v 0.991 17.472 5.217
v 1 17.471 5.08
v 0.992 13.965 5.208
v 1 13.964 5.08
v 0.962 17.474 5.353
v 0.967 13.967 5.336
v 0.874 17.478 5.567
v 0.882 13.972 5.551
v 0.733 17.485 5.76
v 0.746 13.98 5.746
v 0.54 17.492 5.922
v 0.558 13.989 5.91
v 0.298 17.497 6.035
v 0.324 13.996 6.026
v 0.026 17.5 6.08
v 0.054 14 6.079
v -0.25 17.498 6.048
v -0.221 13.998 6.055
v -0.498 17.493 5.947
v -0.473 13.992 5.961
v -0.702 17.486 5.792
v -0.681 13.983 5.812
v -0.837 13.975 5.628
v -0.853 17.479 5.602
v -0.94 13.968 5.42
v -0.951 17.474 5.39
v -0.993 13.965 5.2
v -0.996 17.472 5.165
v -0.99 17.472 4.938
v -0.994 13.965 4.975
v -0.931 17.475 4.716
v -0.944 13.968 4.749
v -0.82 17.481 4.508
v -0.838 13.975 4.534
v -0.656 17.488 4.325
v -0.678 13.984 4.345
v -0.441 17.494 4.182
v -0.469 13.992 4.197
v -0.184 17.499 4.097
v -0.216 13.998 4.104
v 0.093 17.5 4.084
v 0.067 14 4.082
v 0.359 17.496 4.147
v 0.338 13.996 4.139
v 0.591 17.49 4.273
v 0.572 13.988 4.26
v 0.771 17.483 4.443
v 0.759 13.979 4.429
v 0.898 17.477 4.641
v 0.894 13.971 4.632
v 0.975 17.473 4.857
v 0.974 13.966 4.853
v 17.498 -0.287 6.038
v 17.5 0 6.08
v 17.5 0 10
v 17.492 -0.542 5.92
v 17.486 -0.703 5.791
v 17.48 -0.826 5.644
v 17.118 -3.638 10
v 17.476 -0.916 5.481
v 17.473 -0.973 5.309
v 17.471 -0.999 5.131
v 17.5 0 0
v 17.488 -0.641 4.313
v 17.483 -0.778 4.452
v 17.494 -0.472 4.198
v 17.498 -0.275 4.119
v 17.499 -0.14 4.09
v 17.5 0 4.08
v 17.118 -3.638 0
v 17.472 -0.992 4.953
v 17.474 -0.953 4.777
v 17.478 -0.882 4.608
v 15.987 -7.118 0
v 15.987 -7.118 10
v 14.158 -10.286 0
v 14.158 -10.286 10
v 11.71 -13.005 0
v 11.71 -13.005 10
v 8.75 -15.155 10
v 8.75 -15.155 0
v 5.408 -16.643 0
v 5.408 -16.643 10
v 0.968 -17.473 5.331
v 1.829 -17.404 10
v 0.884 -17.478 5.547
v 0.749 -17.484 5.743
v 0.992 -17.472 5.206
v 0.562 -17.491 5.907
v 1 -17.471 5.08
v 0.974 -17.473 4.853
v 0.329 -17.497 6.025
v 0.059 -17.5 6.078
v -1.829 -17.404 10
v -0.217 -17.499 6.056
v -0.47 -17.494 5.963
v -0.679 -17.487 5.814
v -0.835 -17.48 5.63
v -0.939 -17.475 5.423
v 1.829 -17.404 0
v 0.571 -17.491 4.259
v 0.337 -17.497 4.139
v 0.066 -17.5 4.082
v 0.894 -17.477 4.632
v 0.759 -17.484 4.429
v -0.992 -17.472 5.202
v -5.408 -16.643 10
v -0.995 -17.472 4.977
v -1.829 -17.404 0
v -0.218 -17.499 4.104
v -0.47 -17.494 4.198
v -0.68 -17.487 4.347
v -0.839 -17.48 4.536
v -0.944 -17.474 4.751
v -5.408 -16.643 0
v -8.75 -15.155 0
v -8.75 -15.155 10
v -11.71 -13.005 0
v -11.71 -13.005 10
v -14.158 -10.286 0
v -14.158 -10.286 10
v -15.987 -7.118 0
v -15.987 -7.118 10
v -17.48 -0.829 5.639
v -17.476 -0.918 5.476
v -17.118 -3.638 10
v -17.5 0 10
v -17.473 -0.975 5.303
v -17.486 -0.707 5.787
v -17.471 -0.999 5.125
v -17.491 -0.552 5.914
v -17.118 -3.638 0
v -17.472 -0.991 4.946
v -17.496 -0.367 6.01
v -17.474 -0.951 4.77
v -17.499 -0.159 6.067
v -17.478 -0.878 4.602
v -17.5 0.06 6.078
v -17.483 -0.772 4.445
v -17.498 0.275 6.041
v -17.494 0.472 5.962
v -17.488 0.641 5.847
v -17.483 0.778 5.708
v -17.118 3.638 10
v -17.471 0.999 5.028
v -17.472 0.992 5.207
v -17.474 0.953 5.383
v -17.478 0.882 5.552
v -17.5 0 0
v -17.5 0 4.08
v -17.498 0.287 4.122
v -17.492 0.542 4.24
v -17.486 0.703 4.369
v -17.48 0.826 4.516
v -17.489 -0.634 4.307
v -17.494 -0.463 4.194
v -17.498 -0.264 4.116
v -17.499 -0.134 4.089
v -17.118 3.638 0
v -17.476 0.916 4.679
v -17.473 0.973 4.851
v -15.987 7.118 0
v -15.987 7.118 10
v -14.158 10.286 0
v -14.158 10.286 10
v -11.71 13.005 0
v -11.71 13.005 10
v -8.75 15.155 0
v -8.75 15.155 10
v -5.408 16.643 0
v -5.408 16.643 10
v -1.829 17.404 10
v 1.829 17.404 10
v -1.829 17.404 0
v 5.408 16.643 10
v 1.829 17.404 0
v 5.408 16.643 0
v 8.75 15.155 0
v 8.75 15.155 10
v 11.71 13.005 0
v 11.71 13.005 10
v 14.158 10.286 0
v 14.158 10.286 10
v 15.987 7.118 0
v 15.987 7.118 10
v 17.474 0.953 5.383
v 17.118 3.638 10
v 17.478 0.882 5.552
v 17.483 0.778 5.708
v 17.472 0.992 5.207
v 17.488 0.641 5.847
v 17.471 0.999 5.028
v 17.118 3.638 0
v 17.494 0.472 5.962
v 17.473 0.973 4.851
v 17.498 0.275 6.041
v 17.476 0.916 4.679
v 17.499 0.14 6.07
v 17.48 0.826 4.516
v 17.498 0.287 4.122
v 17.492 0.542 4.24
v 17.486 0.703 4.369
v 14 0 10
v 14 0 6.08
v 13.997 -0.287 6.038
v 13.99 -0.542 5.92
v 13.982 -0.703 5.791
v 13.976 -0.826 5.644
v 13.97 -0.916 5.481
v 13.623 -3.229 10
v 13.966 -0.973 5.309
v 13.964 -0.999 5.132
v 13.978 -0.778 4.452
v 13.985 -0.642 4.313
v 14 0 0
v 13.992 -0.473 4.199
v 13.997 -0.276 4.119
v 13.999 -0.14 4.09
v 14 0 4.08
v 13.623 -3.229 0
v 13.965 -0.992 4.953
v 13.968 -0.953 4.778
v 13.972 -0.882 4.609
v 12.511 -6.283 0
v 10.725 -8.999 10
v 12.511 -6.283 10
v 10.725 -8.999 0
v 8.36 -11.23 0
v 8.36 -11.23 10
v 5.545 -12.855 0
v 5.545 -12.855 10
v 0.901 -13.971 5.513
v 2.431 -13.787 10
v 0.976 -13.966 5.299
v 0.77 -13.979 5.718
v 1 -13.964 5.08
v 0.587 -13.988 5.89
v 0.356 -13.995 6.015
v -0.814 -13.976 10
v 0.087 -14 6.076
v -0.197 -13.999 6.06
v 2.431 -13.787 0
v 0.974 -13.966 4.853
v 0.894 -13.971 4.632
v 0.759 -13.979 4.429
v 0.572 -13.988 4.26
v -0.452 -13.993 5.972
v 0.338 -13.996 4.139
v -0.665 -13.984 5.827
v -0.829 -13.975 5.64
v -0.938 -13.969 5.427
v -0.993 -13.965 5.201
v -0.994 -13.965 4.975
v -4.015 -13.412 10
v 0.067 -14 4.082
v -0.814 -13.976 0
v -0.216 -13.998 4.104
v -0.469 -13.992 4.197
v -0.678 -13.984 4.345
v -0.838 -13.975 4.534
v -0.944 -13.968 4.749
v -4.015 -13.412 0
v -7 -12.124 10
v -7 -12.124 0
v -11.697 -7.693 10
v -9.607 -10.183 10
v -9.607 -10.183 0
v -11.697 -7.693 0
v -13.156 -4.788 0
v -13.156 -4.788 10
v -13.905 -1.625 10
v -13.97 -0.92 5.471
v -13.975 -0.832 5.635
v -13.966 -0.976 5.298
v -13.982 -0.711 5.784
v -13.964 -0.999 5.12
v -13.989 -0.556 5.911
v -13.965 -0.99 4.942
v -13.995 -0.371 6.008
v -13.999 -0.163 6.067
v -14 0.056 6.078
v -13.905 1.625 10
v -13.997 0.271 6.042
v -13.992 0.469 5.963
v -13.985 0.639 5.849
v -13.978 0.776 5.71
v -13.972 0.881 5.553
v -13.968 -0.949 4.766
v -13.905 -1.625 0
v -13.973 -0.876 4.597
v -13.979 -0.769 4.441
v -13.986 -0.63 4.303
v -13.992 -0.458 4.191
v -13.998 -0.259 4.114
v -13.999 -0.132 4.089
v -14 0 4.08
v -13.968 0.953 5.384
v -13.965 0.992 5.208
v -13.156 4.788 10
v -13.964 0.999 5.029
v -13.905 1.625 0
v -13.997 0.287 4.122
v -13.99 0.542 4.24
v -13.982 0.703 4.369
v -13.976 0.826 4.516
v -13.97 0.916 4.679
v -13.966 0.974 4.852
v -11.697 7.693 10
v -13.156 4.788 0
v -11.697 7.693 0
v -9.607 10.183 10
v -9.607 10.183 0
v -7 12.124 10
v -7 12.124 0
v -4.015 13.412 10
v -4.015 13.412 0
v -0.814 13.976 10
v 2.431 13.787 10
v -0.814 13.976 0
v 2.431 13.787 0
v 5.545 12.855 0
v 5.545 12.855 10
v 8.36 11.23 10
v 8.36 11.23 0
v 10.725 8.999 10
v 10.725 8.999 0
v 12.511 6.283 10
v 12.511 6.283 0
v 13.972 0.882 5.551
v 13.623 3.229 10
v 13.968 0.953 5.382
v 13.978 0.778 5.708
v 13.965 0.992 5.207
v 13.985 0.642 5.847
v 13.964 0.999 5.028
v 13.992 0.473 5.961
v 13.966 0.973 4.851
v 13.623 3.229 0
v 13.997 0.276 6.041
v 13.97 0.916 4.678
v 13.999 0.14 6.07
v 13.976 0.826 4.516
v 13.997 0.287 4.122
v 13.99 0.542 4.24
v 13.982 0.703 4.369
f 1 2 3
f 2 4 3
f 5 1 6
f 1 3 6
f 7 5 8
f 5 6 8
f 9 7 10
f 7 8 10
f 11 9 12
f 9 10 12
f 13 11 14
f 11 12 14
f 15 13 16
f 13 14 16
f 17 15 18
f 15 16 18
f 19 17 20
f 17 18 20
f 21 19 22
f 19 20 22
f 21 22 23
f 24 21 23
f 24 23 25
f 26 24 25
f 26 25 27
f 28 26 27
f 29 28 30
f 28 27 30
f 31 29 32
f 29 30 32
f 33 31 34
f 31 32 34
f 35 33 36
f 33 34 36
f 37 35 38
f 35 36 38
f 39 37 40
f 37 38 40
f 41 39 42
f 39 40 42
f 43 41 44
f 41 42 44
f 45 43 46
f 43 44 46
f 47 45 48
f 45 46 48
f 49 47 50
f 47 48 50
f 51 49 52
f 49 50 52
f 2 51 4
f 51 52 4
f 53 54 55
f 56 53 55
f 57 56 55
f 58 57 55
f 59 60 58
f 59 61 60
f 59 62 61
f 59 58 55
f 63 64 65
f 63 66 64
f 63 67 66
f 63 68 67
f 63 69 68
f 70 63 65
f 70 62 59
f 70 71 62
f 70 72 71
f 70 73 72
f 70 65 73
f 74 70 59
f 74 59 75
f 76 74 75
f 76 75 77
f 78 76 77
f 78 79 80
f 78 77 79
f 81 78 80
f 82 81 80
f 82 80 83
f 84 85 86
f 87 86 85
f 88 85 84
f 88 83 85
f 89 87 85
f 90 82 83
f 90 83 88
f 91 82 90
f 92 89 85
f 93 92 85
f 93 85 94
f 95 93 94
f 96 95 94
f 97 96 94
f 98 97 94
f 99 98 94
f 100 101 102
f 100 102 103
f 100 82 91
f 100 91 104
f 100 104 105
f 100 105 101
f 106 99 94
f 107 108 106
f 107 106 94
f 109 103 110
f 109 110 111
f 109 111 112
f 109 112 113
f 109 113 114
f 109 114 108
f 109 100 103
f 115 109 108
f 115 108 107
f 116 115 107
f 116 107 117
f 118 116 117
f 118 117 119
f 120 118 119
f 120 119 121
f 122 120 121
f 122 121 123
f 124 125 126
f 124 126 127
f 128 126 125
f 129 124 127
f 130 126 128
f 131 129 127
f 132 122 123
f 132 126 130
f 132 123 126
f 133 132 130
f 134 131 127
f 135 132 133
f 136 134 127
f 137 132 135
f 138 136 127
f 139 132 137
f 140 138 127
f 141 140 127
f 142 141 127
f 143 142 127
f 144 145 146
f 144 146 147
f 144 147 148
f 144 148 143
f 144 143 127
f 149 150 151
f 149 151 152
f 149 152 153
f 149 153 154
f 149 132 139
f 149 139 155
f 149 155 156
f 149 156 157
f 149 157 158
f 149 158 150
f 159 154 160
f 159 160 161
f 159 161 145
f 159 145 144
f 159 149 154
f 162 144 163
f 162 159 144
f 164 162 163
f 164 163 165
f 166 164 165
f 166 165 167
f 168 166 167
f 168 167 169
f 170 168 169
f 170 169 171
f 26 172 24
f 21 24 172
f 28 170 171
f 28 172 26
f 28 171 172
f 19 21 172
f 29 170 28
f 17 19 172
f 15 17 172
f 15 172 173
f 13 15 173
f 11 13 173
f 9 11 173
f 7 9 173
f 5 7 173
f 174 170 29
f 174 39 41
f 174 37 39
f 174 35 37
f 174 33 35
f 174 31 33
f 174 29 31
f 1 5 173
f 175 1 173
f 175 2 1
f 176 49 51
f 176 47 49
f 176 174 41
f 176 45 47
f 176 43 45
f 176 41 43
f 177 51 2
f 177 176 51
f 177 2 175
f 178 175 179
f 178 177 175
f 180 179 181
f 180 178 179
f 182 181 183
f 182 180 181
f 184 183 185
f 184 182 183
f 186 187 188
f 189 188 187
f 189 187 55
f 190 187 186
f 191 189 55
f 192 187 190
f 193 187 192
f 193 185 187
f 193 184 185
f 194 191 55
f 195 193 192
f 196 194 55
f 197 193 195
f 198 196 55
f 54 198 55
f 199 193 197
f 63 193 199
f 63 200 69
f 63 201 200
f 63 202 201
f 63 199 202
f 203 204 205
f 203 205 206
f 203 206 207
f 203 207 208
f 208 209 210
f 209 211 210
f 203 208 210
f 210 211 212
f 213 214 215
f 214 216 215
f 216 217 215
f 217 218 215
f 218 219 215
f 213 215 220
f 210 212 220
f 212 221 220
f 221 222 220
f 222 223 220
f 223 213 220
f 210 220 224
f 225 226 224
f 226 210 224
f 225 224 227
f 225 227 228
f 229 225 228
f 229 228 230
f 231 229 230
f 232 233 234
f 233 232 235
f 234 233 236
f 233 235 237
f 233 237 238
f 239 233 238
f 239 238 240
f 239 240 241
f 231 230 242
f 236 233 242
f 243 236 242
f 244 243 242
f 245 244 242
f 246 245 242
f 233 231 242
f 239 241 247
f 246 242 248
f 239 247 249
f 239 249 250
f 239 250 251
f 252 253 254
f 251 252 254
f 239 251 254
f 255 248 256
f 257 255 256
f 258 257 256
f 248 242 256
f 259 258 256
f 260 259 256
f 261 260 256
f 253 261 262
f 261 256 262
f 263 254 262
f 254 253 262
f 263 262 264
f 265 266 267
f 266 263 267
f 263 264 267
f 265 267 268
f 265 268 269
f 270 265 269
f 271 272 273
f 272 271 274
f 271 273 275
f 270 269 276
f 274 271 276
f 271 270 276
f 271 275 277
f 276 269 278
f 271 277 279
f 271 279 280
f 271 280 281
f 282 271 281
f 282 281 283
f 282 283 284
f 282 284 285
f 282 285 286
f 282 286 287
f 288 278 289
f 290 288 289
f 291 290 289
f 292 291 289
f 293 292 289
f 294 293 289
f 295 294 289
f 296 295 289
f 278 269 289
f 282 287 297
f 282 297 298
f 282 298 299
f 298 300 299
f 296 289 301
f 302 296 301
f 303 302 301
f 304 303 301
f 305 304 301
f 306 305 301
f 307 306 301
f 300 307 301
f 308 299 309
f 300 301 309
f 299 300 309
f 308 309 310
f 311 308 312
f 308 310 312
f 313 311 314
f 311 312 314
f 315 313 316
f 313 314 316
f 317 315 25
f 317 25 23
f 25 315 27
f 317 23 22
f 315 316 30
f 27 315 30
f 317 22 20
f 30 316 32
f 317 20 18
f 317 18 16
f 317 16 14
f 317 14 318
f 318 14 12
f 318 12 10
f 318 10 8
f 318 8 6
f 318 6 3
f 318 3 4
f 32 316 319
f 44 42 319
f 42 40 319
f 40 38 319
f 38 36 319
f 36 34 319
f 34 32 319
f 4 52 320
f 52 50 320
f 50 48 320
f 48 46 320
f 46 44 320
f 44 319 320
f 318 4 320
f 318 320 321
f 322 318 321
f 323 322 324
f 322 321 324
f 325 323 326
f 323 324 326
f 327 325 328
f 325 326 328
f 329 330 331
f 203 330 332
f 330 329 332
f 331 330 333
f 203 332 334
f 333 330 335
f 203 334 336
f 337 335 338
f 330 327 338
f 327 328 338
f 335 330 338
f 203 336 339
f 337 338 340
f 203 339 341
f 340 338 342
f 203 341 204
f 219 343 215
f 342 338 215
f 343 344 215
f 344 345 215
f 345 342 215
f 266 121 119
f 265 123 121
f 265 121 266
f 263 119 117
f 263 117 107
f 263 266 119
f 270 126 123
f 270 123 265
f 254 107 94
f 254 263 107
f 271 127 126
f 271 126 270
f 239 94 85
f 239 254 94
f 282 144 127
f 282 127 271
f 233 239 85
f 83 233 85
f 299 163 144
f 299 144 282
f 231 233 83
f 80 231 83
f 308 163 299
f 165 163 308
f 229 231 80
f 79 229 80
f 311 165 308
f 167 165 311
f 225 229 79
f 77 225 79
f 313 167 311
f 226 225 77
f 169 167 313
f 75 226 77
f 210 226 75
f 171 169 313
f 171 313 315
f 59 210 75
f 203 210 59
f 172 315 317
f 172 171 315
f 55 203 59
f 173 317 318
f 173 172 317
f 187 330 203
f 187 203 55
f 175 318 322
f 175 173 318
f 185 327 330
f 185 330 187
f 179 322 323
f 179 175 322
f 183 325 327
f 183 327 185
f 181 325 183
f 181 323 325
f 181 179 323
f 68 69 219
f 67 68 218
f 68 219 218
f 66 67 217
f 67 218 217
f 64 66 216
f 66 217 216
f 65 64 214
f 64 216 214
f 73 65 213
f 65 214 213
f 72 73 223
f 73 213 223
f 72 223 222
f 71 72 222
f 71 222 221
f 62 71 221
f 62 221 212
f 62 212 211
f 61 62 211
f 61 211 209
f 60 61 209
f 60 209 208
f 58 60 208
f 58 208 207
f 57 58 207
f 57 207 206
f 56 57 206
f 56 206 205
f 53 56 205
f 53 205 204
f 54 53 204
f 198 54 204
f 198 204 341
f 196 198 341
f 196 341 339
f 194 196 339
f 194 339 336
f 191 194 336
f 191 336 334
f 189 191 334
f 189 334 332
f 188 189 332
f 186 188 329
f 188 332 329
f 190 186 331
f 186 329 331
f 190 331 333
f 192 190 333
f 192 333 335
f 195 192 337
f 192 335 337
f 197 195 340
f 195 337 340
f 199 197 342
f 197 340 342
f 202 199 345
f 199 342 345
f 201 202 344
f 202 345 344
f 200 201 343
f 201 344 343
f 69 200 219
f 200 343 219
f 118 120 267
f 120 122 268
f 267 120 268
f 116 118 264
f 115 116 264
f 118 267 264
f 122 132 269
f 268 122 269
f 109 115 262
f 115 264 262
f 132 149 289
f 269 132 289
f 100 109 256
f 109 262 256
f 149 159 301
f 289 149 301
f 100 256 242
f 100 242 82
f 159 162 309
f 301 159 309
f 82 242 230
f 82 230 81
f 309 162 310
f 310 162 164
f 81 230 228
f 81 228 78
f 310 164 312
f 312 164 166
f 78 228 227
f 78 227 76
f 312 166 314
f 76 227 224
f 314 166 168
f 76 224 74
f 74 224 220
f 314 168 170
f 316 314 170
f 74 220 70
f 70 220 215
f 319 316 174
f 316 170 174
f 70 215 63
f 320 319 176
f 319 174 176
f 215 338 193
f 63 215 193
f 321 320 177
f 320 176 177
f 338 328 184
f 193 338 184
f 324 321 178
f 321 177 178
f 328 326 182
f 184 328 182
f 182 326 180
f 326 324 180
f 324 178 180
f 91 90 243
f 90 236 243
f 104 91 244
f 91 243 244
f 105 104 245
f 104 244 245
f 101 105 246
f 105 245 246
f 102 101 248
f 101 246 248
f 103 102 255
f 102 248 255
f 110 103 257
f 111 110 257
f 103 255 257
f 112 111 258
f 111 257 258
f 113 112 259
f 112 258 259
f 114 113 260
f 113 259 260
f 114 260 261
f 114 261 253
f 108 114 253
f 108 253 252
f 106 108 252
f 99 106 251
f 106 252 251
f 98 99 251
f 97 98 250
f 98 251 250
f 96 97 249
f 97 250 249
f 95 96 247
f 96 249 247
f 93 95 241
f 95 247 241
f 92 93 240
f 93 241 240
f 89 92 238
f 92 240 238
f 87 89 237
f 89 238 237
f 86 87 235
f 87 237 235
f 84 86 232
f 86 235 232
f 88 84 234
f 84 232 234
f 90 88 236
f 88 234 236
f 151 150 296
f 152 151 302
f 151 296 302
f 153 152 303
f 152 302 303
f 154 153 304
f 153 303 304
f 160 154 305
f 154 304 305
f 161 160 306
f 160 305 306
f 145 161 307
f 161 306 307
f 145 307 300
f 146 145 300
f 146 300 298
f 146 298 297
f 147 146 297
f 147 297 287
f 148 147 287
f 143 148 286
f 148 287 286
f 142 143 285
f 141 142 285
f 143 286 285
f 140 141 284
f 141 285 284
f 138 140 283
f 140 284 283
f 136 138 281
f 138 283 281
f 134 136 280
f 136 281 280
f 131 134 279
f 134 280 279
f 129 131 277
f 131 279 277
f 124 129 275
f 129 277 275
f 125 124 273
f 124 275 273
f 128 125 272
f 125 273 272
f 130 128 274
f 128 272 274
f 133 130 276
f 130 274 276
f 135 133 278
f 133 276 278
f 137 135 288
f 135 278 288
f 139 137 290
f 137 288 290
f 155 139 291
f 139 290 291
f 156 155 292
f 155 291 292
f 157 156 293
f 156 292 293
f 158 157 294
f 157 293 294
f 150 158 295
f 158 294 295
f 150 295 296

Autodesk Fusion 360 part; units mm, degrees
sketch "Sketch1" plane through (0, 0, 0) normal (0, 0, 1) x (1, 0, 0)
  circle A0 centre (0, 0) radius 14
  circle A1 centre (0, 0) radius 17.5
  dimension "d1" = 35
  dimension "d2" = 28
extrude "Extrude1" add sketch "Sketch1" along normal blind 10
sketch "Sketch2" plane through (0, 0, 0) normal (0, 1, 0) x (1, 0, 0)
  circle A0 centre (0, -5.08) radius 1
  dimension "d5" = 2
  dimension "d6" = 5.08
extrude "Extrude2" cut sketch "Sketch2" along normal through all and the other way through all
sketch "Sketch3" plane through (0, 0, 0) normal (1, 0, 0) x (0, 0, -1)
  circle A0 centre (-5.08, 0) radius 1
  dimension "d9" = 2
  dimension "d10" = 5.08
extrude "Extrude3" cut sketch "Sketch3" along normal through all and the other way through all
